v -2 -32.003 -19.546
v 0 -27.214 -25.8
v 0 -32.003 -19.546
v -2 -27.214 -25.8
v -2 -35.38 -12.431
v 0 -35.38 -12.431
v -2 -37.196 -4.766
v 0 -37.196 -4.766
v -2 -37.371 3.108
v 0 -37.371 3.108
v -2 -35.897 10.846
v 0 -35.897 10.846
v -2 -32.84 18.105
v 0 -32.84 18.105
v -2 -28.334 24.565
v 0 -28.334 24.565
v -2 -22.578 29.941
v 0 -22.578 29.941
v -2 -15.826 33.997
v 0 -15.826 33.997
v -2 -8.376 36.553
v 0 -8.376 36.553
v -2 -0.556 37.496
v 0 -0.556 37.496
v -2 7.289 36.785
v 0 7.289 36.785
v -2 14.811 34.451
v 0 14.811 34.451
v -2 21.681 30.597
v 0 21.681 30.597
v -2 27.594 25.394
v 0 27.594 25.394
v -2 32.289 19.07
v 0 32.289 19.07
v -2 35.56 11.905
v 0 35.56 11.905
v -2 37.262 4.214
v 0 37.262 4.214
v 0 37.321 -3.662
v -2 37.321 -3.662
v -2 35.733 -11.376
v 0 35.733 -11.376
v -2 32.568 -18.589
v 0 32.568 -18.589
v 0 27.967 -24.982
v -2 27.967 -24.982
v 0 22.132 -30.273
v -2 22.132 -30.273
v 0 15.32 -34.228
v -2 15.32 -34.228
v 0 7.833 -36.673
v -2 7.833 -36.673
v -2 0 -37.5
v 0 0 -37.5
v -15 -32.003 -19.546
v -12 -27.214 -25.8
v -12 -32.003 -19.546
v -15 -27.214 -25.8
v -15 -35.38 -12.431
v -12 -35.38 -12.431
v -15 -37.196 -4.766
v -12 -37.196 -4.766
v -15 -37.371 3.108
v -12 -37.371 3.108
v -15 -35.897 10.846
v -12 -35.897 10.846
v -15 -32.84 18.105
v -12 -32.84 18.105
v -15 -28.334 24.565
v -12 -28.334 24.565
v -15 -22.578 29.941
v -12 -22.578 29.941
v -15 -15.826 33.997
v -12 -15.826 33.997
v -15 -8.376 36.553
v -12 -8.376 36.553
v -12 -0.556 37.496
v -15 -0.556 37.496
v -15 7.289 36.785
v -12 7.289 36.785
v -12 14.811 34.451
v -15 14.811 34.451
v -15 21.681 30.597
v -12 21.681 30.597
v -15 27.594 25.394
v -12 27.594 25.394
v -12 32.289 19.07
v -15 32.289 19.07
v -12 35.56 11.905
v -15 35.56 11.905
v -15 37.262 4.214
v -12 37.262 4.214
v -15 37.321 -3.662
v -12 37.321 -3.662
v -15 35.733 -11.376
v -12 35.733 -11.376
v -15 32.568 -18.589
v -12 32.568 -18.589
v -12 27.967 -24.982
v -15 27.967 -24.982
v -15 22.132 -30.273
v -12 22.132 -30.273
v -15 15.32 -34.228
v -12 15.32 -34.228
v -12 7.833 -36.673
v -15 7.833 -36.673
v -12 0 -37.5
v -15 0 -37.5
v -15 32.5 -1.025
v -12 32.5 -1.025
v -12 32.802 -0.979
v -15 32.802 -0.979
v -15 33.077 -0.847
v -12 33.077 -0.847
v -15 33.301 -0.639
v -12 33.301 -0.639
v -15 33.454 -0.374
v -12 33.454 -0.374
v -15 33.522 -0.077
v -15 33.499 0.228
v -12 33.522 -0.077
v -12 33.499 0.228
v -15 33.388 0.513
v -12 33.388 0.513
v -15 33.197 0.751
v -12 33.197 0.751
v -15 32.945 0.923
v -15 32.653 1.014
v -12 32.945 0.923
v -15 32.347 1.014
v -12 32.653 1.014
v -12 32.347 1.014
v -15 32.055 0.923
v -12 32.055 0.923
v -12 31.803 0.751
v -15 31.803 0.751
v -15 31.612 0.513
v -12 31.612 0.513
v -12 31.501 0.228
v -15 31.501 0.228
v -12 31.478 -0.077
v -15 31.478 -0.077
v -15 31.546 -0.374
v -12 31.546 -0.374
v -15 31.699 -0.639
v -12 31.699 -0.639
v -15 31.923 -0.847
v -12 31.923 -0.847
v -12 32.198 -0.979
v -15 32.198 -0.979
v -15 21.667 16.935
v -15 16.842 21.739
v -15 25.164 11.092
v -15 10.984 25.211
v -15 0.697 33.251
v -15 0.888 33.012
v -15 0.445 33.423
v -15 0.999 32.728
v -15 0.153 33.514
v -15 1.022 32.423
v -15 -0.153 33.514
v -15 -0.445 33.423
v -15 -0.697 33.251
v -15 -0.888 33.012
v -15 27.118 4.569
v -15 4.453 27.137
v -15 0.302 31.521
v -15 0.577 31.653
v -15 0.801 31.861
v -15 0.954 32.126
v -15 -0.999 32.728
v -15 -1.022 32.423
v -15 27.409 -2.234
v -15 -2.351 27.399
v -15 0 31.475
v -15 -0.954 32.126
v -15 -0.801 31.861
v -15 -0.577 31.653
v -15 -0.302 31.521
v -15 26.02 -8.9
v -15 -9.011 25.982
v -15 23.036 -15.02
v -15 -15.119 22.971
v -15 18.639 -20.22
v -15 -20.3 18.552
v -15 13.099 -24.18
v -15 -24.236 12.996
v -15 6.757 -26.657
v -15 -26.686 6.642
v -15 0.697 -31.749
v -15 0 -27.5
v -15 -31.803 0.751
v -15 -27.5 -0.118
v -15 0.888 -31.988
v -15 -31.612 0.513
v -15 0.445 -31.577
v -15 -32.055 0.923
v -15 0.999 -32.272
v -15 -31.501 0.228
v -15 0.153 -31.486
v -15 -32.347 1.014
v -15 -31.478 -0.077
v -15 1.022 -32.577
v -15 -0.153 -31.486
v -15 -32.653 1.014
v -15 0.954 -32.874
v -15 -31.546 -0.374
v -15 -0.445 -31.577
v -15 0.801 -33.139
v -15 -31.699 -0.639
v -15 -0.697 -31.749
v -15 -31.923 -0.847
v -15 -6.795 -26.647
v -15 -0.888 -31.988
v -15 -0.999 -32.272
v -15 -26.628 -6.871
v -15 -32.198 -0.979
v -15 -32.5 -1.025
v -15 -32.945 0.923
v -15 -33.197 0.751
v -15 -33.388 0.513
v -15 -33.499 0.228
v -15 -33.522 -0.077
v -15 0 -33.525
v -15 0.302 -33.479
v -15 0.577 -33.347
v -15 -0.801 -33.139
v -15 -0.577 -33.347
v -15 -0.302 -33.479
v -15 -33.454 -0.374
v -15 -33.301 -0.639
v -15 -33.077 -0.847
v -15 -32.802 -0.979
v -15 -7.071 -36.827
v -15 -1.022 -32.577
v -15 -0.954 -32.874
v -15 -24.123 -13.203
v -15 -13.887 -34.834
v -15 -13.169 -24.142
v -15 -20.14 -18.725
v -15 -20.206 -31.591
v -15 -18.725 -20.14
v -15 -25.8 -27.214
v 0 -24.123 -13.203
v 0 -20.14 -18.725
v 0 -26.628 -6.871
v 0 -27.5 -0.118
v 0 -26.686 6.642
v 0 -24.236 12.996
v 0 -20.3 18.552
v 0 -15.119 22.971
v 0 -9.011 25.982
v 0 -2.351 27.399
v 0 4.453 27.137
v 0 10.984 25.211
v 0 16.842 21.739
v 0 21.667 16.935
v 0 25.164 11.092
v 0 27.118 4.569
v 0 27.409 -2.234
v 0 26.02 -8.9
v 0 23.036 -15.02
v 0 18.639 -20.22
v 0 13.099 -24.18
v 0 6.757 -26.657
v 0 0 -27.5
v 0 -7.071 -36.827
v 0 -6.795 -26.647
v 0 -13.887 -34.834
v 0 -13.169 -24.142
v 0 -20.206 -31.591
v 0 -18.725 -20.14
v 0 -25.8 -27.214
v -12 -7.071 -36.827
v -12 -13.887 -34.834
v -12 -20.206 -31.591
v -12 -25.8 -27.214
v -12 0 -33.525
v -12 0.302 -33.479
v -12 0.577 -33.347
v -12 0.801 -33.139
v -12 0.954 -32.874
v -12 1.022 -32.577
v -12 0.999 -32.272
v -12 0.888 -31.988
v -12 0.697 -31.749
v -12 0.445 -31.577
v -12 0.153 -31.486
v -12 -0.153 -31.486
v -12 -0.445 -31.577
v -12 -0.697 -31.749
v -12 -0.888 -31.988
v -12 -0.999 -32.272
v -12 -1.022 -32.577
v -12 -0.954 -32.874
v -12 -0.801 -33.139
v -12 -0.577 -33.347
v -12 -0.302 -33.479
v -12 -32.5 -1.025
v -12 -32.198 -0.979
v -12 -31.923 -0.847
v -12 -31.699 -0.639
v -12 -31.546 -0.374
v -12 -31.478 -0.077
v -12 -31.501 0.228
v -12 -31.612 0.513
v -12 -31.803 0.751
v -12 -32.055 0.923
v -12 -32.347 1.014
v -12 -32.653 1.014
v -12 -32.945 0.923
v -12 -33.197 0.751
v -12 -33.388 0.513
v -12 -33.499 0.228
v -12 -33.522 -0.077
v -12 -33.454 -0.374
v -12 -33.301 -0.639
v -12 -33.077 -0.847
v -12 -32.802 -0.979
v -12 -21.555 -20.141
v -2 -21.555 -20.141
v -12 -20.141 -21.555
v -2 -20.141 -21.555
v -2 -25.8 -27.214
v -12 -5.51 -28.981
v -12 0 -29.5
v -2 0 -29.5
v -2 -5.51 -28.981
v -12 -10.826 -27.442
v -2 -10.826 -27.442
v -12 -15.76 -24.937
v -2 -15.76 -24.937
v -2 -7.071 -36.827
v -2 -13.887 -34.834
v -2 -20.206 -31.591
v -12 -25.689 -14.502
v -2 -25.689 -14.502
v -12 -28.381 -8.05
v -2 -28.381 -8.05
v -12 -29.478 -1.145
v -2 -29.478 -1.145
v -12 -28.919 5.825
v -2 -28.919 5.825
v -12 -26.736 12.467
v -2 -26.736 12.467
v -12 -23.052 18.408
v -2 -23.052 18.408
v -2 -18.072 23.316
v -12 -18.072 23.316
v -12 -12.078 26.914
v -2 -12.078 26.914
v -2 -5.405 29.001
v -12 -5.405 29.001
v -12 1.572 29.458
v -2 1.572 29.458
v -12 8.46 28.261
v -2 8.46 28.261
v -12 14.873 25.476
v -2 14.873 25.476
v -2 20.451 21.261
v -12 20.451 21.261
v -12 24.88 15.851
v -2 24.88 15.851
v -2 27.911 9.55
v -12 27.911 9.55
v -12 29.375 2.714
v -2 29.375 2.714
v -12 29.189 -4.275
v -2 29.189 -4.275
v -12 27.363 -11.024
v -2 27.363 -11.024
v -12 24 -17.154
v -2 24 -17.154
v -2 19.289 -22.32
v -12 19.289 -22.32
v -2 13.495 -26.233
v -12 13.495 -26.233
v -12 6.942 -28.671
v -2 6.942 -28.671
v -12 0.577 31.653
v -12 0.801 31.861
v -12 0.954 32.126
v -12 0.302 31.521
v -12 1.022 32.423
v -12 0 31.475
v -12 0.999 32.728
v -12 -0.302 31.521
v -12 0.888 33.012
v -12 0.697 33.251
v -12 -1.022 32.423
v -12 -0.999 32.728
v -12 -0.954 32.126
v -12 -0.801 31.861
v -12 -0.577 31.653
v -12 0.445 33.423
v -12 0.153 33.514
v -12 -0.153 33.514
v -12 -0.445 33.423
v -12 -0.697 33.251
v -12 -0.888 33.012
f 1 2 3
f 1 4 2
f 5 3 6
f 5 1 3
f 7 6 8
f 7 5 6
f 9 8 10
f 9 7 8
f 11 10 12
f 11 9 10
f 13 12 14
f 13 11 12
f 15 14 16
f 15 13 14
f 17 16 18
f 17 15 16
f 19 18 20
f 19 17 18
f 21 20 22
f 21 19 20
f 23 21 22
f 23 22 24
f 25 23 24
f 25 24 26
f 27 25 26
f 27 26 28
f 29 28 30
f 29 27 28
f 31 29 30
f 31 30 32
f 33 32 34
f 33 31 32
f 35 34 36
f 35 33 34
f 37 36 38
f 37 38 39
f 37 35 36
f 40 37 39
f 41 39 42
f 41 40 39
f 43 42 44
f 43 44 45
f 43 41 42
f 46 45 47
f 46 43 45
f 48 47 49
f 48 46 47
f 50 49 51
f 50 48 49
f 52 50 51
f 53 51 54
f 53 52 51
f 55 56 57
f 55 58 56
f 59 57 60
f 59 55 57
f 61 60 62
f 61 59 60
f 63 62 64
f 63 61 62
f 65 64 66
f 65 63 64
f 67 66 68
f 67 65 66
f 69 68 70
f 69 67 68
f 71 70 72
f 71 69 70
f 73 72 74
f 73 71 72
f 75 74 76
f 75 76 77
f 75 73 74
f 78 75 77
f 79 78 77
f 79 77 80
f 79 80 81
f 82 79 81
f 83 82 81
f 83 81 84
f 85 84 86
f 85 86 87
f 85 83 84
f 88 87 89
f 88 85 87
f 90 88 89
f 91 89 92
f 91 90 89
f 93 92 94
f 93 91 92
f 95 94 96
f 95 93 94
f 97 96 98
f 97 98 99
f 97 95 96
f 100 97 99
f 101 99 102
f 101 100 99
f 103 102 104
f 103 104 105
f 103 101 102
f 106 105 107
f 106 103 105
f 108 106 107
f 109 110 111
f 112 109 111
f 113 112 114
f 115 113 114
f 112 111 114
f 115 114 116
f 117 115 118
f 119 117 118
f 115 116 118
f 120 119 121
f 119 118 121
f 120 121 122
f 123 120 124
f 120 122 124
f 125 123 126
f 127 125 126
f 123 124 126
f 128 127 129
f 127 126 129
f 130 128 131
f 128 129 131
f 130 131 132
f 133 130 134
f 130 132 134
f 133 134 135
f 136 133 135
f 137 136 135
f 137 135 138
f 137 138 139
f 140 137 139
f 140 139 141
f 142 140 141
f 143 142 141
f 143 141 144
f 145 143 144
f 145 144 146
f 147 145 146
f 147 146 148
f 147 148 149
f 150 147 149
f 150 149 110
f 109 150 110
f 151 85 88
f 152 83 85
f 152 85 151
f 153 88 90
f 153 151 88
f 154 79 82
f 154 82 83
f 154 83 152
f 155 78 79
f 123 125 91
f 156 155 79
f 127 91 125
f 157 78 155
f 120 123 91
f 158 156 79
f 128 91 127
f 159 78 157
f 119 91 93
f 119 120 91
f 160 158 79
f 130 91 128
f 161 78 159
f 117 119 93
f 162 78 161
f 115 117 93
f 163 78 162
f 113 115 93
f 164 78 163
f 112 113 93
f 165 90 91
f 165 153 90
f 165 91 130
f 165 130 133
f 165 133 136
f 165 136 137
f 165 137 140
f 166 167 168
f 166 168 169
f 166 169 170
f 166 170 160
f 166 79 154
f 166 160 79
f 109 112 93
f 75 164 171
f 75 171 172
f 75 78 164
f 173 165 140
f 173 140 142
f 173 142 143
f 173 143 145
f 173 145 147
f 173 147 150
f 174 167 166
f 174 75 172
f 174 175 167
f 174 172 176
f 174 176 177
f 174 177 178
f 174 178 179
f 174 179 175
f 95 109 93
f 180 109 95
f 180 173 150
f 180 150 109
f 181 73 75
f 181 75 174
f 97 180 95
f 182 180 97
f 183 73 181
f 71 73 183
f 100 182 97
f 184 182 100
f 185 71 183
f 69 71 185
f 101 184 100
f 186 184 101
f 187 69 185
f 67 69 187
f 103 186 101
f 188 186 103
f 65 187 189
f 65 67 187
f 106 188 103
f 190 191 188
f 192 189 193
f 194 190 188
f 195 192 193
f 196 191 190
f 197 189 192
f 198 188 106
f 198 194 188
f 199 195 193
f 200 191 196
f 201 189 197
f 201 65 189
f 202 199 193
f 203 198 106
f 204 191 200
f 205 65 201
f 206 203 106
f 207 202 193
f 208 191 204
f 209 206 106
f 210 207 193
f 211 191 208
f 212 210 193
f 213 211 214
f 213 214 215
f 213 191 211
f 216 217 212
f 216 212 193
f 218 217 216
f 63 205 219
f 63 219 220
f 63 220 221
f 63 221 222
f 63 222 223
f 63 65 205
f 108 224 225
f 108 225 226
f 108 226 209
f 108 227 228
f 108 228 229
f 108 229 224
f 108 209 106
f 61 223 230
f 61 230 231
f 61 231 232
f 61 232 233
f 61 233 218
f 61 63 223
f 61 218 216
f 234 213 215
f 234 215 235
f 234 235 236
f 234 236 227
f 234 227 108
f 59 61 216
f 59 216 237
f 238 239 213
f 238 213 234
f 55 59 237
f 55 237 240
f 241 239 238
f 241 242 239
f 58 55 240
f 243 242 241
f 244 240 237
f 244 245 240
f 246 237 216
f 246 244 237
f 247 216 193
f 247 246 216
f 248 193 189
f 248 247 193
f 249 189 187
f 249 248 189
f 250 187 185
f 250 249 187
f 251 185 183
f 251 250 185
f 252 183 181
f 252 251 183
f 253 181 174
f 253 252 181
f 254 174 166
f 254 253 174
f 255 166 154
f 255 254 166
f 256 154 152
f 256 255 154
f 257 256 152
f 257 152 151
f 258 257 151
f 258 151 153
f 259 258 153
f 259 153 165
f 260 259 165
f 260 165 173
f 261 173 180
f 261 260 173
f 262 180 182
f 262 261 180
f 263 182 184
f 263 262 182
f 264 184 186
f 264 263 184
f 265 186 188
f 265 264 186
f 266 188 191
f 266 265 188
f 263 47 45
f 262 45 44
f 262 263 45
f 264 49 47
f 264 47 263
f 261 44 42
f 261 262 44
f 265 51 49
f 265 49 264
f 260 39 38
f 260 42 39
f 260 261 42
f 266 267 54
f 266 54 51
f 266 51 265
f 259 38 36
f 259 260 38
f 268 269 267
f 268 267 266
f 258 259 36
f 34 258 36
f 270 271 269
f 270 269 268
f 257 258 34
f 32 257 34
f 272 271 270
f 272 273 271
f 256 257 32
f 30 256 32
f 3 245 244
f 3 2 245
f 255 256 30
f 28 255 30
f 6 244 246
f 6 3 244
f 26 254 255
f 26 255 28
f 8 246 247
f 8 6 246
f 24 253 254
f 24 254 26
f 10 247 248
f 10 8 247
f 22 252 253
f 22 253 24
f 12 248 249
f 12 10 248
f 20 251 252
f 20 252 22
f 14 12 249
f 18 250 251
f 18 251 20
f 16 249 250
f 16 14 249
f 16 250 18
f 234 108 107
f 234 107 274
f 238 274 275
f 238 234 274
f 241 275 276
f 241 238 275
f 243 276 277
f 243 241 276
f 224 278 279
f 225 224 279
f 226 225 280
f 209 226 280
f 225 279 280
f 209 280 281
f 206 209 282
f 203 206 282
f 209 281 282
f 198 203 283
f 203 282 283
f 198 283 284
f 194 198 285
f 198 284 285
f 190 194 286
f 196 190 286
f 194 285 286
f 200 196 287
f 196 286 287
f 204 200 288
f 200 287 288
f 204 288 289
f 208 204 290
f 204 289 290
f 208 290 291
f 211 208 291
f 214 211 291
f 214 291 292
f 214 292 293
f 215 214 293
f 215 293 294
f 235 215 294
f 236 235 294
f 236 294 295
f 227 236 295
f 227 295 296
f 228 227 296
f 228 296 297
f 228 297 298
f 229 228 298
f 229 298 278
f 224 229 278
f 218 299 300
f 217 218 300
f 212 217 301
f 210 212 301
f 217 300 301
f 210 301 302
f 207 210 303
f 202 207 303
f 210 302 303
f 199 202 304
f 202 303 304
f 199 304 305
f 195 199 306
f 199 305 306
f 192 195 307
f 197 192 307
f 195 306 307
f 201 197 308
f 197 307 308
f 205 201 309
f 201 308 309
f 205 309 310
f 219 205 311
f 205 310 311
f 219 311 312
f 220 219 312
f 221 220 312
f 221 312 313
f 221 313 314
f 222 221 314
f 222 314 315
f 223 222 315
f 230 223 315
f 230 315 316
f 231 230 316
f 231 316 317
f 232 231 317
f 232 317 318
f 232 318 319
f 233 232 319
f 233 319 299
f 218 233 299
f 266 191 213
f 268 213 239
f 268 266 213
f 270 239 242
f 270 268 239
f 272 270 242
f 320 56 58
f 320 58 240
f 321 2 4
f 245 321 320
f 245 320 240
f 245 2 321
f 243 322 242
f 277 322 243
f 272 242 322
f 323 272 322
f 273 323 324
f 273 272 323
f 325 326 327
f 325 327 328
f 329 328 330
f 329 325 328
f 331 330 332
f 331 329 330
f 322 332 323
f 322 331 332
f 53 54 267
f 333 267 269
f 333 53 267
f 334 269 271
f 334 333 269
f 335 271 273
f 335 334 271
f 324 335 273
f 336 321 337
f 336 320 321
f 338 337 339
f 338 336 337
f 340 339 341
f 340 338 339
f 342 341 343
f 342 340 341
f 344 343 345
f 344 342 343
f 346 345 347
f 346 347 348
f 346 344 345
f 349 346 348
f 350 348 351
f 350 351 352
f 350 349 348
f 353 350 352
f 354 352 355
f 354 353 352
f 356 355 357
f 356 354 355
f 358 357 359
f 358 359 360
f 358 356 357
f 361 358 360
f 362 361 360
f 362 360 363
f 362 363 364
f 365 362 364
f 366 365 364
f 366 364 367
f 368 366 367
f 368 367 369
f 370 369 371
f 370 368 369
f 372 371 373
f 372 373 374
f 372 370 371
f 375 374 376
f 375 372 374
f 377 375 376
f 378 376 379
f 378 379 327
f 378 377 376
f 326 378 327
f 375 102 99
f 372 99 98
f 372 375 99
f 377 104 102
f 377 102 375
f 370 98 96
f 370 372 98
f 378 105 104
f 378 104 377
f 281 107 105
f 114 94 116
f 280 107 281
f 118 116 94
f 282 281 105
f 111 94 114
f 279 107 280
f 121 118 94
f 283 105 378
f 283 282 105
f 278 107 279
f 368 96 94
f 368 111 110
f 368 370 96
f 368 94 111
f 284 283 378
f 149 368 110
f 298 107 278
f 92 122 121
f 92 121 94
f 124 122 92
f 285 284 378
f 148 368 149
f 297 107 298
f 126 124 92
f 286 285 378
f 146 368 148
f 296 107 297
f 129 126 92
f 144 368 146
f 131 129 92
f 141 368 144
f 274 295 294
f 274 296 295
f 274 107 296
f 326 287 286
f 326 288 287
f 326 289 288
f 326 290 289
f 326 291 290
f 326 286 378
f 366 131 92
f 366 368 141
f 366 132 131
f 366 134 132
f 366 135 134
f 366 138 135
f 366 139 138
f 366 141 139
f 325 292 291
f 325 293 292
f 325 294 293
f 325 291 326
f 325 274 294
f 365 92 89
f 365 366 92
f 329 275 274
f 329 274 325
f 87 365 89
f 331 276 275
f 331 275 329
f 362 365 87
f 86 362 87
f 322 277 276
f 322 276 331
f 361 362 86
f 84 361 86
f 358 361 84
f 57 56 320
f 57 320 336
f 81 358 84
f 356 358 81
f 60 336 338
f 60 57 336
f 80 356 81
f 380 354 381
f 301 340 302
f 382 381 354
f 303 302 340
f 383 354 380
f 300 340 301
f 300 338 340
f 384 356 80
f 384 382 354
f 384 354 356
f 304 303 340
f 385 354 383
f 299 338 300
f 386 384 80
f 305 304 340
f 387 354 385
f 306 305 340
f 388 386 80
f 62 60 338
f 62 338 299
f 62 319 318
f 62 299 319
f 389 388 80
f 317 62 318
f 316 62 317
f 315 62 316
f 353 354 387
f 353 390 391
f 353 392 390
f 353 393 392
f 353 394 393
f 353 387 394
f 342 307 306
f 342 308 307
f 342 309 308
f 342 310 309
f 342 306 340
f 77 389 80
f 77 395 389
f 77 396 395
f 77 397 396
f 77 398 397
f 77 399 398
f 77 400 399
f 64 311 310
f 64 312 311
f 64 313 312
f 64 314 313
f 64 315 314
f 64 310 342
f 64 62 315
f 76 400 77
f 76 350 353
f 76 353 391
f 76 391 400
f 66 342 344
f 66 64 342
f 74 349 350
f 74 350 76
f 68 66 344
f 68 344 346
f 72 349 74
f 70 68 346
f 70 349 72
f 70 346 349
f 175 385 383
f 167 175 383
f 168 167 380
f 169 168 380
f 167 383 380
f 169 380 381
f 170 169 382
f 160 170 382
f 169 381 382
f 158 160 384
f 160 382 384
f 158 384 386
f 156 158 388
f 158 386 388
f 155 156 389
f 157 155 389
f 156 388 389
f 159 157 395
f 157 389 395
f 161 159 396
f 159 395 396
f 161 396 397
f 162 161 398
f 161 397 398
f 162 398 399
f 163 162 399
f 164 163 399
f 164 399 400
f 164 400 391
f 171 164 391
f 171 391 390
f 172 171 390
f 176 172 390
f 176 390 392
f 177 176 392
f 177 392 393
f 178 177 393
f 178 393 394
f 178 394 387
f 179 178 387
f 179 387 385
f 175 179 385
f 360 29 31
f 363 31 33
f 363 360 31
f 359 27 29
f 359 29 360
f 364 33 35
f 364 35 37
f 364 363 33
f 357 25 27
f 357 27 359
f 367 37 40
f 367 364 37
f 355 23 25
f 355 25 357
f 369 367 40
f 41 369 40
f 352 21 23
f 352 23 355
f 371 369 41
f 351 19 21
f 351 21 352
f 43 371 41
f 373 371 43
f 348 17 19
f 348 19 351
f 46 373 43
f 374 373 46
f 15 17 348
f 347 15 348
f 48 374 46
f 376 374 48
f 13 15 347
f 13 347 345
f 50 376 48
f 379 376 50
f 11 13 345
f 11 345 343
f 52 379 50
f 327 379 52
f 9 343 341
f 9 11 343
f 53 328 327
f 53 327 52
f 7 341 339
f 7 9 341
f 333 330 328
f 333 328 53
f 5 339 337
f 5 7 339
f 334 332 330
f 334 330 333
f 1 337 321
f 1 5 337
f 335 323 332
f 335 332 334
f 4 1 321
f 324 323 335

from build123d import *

# Parameters (mm, degrees)
M2_5X0_45_TAPPED_HOLE2_D     = 2.05
M2_5X0_45_TAPPED_HOLE2_DEPTH = 6.35
M2_5X0_45_TAPPED_HOLE2_TIP   = 0.615882135
CUT_EXTRUDE1_DEPTH           = 56.113519213


with BuildPart() as part:
    # Sketch1 → Revolve1 (revolve)
    with BuildSketch(Plane.XY, mode=Mode.PRIVATE) as revolve1_sk:
        Polygon((-15, 27.5), (0, 27.5), (0, 37.5), (-2, 37.5), (-2, 29.5), (-12, 29.5), (-12, 37.5), (-15, 37.5), align=None)
    revolve(revolve1_sk.sketch.rotate(Axis((0, 0, 0), (-1, 0, 0)), 90), axis=Axis((0, 0, 0), (-1, 0, 0)))

    # M2.5x0.45 Tapped Hole2
    with Locations(Plane.ZY.offset(15)):
        with Locations((0, -32.5), (-32.5, 0), (32.5, 0), (0, 32.5)):
            Hole(M2_5X0_45_TAPPED_HOLE2_D / 2, depth=M2_5X0_45_TAPPED_HOLE2_DEPTH)
            with Locations((0, 0, -(M2_5X0_45_TAPPED_HOLE2_DEPTH + M2_5X0_45_TAPPED_HOLE2_TIP / 2))):  # 118° drill point
                Cone(0, M2_5X0_45_TAPPED_HOLE2_D / 2, M2_5X0_45_TAPPED_HOLE2_TIP, mode=Mode.SUBTRACT)

    # Sketch6 → Cut-Extrude1 (cut, through all)
    with BuildSketch(Plane(origin=(0, 0, 0), x_dir=(0, 0, -1), z_dir=(1, 0, 0))):
        Polygon((27.223611076, -25.809397513), (25.809397513, -27.223611076), (18.725468962, -20.139682524), (20.139682524, -18.725468962), align=None)
    extrude(amount=-CUT_EXTRUDE1_DEPTH, mode=Mode.SUBTRACT)


solid = part.part
